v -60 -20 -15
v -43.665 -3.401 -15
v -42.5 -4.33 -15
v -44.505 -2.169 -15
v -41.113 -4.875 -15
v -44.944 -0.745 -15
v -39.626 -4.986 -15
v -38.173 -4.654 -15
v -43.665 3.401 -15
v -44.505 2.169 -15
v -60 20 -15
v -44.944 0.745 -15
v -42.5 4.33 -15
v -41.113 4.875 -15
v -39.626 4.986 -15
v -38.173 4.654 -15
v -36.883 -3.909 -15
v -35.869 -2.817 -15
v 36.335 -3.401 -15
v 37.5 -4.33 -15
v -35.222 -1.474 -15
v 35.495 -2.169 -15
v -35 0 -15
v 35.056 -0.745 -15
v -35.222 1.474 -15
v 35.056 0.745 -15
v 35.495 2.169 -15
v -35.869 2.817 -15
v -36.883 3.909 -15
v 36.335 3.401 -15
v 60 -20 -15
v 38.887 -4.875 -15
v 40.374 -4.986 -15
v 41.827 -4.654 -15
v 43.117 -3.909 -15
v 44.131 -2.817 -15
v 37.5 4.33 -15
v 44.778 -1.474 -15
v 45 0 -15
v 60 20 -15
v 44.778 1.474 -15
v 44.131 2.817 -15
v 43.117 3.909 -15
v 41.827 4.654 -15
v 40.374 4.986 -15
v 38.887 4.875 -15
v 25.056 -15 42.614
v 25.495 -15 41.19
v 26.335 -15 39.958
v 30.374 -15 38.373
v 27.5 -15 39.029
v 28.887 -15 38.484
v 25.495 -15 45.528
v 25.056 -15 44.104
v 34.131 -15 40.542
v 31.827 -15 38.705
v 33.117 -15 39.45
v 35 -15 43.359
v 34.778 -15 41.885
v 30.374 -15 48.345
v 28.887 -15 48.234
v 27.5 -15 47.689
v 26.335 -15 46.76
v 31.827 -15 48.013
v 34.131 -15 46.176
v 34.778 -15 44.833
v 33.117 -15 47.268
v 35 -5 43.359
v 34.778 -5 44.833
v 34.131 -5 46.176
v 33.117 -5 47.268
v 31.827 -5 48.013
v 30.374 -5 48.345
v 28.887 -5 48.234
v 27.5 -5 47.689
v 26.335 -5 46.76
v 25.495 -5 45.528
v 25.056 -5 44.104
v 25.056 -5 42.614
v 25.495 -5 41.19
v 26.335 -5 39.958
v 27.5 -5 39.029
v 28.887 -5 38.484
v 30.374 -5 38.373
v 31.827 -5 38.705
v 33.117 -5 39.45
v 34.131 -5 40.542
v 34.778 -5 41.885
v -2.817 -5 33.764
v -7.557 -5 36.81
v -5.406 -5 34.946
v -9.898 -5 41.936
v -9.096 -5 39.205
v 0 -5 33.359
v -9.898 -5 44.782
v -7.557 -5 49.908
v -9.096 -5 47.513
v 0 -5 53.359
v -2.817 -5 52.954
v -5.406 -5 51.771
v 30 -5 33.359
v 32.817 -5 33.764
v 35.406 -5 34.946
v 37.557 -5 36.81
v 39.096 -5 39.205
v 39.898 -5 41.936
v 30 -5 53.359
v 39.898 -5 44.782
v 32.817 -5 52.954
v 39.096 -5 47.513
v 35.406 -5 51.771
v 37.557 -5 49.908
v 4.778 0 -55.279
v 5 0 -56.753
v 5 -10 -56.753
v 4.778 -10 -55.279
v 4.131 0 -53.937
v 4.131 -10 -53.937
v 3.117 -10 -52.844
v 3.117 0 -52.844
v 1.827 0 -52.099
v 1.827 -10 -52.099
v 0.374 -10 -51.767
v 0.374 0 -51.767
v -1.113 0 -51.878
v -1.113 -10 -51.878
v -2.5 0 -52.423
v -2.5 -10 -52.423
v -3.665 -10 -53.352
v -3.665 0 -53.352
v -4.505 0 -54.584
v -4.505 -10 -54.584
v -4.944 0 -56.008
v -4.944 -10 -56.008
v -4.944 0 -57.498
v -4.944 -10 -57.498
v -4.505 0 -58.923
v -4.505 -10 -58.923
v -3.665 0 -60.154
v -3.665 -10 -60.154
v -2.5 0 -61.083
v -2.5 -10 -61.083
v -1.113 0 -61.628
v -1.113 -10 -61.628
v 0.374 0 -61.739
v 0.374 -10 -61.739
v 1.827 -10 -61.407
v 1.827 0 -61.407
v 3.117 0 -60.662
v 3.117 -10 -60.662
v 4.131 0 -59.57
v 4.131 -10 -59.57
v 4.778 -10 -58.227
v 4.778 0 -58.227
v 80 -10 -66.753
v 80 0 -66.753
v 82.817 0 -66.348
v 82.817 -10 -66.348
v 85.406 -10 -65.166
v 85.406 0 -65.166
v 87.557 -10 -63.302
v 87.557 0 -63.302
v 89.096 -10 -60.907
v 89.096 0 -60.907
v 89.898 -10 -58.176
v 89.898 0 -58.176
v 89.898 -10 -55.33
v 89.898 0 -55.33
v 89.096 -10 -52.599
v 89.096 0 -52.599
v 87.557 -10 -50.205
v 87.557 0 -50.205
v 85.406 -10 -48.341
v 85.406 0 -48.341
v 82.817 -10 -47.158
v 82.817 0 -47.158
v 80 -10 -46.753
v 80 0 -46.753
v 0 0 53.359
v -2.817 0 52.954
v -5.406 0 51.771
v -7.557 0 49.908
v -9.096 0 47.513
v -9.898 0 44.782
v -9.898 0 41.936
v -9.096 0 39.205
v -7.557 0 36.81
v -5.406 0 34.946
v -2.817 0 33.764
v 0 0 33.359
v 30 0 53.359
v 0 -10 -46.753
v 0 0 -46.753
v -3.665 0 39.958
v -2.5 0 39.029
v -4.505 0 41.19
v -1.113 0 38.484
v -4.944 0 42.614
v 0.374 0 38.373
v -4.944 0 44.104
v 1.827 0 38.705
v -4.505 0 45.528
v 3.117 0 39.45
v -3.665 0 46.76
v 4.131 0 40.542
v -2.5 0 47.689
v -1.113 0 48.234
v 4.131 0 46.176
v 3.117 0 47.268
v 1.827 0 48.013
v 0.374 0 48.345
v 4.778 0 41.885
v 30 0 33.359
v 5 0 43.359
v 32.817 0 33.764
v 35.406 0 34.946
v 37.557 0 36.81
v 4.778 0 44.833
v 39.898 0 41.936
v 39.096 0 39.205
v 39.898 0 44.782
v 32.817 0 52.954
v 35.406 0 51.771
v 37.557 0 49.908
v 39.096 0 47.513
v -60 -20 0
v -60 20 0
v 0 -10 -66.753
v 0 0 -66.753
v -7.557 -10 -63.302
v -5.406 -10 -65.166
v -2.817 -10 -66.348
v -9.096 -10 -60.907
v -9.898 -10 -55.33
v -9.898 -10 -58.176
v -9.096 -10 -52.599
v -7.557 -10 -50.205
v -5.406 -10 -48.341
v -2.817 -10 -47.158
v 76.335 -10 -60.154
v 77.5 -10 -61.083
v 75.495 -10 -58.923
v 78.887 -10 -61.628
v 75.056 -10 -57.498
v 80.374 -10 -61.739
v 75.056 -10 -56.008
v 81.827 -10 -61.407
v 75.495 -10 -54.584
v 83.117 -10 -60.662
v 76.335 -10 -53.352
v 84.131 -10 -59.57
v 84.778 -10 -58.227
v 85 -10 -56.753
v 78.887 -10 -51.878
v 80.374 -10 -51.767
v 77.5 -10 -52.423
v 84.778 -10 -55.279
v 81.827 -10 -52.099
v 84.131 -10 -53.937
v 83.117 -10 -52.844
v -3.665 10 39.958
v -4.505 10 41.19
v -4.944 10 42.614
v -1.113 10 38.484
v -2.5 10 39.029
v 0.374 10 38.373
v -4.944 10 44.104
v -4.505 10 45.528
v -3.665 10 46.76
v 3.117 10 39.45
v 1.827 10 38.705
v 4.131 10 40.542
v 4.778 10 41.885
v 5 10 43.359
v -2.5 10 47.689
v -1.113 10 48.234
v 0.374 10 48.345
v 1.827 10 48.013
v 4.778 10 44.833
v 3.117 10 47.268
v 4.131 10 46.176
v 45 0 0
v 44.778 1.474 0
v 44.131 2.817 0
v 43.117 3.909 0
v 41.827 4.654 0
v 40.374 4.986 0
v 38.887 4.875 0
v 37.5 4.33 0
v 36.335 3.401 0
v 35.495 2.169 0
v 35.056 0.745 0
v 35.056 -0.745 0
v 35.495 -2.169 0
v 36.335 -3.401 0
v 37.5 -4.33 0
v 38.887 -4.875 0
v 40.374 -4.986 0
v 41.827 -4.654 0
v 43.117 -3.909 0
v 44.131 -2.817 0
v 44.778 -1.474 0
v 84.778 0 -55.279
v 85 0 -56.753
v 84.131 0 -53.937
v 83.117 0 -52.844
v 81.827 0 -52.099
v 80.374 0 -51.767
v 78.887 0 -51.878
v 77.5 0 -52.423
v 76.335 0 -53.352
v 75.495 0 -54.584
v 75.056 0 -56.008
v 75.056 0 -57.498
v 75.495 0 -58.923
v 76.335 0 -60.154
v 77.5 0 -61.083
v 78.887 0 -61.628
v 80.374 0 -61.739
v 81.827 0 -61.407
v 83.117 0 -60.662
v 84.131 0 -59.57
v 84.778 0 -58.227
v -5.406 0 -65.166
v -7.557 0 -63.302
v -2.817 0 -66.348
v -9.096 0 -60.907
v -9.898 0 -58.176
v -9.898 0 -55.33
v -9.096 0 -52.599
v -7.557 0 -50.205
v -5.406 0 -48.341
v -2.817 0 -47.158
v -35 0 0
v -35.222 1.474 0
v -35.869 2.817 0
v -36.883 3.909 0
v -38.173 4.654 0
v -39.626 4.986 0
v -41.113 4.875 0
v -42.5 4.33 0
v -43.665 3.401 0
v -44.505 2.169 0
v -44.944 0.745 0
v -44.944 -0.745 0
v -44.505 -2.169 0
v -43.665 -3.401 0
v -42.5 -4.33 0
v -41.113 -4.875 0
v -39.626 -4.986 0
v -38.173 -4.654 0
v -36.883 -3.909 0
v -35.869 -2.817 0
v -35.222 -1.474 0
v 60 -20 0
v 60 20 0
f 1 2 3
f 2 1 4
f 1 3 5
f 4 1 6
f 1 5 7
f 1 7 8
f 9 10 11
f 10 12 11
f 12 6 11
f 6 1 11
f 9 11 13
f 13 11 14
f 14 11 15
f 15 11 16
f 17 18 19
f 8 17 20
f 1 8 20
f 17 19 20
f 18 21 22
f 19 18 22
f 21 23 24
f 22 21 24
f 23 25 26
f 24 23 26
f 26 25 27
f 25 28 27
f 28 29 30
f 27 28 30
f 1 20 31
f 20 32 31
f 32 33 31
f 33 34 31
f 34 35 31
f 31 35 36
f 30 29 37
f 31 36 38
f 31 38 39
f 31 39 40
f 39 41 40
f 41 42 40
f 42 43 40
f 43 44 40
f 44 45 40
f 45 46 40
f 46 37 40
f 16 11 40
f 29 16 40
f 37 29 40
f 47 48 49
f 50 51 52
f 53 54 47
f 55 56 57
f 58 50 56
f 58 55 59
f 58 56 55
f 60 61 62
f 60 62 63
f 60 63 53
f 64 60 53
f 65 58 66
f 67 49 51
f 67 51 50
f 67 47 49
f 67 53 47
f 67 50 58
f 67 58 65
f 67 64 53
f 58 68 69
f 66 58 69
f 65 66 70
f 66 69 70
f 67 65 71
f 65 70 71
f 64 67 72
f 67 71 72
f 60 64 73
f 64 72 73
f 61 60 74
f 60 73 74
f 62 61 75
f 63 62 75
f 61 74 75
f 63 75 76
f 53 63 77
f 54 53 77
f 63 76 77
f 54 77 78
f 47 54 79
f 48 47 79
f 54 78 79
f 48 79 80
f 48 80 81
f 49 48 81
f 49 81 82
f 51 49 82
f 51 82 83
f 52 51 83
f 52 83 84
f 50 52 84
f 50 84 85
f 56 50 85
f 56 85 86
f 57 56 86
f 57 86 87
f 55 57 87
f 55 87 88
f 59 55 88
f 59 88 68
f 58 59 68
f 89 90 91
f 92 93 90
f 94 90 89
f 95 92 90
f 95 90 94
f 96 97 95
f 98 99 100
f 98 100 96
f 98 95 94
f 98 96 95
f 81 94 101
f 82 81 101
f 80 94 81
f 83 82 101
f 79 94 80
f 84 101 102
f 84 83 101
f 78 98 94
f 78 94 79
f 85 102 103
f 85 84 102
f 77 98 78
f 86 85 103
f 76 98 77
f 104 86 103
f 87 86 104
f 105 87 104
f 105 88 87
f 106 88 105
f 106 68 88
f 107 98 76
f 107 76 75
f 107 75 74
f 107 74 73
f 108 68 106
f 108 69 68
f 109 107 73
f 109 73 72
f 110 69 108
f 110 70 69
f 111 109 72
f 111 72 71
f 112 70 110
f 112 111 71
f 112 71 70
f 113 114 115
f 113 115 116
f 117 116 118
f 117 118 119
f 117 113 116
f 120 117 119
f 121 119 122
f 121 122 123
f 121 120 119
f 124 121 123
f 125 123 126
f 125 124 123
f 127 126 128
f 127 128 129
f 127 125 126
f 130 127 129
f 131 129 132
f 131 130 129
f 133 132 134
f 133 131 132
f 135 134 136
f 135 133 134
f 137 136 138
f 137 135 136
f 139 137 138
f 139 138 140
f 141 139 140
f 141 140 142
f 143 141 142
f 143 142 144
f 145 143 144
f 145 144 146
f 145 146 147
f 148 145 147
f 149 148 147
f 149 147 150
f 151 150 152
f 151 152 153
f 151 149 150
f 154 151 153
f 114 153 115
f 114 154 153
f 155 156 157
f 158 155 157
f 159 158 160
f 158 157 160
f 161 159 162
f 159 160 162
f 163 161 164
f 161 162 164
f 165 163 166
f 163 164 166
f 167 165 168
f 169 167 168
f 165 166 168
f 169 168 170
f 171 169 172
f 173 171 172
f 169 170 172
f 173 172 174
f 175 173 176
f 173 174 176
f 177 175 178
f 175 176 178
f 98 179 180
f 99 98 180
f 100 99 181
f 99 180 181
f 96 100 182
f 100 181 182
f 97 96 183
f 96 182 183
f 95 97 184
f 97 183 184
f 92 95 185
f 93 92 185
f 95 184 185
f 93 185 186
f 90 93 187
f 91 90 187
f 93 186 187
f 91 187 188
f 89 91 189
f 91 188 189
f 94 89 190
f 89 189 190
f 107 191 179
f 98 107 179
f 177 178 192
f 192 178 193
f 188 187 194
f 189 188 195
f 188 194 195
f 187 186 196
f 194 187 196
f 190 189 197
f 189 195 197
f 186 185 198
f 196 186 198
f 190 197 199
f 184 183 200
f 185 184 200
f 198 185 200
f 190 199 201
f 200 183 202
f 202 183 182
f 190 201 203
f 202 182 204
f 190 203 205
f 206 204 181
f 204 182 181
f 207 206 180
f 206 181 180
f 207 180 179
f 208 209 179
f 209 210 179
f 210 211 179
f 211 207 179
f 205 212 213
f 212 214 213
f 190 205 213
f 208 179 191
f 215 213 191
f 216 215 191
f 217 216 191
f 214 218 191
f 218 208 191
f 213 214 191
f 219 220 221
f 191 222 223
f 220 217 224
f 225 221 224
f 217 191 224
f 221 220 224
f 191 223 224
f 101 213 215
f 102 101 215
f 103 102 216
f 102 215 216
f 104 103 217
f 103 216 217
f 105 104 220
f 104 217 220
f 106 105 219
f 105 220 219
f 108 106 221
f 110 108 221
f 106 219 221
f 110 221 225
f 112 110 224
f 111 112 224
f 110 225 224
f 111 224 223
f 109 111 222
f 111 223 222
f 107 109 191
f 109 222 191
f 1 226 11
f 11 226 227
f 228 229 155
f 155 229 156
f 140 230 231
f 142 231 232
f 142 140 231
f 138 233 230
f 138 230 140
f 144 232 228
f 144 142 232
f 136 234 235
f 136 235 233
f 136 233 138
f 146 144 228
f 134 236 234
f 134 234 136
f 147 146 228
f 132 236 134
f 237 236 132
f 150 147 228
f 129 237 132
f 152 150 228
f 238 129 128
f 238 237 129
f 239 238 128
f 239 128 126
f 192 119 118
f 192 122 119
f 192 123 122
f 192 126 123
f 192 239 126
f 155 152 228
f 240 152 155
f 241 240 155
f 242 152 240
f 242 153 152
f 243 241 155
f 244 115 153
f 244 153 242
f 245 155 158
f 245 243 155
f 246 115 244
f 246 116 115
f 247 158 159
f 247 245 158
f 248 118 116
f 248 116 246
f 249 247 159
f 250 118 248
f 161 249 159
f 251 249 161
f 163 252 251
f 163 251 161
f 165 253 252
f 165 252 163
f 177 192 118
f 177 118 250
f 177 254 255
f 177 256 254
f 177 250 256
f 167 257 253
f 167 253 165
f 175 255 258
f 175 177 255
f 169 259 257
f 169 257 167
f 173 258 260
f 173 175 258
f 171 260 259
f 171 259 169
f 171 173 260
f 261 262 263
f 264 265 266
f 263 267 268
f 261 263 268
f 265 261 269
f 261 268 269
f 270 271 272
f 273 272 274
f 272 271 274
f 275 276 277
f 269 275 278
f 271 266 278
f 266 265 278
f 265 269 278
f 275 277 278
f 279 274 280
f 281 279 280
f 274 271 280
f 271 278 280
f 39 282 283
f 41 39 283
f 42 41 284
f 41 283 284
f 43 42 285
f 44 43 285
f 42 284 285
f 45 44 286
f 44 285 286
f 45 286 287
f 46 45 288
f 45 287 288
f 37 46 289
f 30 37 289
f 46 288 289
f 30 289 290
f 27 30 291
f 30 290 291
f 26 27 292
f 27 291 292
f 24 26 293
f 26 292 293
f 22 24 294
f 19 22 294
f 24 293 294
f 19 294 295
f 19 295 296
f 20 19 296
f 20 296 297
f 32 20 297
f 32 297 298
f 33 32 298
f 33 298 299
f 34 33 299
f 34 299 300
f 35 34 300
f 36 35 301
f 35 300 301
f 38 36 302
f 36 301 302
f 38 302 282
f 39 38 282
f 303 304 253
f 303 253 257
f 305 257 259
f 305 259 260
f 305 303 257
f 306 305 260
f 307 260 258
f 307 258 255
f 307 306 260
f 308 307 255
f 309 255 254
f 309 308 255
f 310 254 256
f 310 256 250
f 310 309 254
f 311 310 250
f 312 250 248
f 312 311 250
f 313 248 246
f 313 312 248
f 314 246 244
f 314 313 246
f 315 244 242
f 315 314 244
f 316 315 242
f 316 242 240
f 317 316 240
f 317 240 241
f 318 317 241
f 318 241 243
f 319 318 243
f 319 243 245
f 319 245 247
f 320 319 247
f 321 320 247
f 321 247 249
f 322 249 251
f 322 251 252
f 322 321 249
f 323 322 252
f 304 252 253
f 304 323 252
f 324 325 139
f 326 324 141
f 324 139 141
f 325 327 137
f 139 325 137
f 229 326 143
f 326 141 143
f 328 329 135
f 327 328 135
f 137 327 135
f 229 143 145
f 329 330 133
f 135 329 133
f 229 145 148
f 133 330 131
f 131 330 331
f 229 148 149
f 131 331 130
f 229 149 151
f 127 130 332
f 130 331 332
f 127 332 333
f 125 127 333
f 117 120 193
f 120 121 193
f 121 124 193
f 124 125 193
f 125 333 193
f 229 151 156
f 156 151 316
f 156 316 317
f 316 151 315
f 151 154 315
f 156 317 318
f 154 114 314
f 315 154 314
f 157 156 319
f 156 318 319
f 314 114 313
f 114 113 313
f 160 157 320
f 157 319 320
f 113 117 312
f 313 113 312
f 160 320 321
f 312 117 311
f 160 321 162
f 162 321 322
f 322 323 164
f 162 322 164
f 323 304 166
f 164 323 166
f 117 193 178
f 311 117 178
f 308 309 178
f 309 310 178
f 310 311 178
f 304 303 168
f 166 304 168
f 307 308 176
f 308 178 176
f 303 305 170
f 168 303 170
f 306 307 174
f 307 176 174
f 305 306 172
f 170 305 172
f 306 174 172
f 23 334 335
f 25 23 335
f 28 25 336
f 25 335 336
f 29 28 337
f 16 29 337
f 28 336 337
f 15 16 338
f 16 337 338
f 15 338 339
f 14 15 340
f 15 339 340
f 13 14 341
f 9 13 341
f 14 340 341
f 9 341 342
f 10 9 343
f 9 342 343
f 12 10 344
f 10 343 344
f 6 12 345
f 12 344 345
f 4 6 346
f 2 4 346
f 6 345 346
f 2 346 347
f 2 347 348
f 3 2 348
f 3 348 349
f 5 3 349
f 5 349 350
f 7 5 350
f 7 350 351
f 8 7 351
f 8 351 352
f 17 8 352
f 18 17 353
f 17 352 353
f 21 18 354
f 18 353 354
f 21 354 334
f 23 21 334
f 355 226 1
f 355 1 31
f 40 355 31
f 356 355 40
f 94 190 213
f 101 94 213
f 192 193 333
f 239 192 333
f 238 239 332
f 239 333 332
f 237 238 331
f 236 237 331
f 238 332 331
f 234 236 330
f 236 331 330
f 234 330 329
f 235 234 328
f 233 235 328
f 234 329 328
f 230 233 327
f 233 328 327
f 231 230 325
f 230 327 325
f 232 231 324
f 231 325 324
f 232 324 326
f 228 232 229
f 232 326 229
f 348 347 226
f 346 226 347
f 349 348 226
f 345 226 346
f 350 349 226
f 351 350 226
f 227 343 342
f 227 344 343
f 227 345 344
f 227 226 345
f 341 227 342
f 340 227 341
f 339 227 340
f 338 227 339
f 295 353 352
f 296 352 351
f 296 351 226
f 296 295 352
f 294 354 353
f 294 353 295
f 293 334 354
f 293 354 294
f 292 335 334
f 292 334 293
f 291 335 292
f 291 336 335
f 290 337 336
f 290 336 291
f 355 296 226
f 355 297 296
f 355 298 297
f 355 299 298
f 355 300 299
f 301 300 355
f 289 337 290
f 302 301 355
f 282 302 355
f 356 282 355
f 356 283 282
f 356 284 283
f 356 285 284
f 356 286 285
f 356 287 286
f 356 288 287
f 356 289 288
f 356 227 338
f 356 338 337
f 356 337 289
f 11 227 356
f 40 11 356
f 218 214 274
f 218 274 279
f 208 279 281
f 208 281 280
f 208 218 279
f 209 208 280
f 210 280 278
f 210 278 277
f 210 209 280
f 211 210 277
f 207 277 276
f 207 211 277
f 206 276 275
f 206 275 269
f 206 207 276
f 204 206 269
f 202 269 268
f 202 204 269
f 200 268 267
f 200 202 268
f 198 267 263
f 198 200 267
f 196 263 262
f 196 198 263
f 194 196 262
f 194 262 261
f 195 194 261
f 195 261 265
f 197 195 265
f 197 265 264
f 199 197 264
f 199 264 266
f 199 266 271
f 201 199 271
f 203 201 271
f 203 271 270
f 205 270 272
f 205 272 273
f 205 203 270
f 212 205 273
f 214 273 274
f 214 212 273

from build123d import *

# Parameters (mm, degrees)
F0_W     = 120
F0_H     = 40
F0_R     = 5
F1_DEPTH = 15
F2_R     = 5
F3_DEPTH = 5
F4_DEPTH = 15
F5_DEPTH = 10
F6_R     = 5
F7_DEPTH = 10


with BuildPart() as f1:
    # F0 (on Top) → F1 (new body)
    with BuildSketch(Plane.XY):
        Rectangle(F0_W, F0_H)
        with Locations((-40, 0)):
            Circle(F0_R, mode=Mode.SUBTRACT)
        with Locations((40, 0)):
            Circle(F0_R, mode=Mode.SUBTRACT)
    extrude(amount=-F1_DEPTH)


with BuildPart() as f3:
    # F2 (on Front) → F3 (new body)
    with BuildSketch(Plane.XZ):
        with BuildLine():
            Line((30, 53.35892), (0, 53.35892))
            ThreePointArc((0, 53.35892), (-10, 43.35892), (0, 33.35892))
            Line((0, 33.35892), (30, 33.35892))
            ThreePointArc((30, 33.35892), (40, 43.35892), (30, 53.35892))
        make_face()
        with Locations((0, 43.35892)):
            Circle(F2_R, mode=Mode.SUBTRACT)
        with Locations((30, 43.35892)):
            Circle(F2_R, mode=Mode.SUBTRACT)
        with Locations((30, 43.35892)):
            Circle(F2_R)
        with Locations((0, 43.35892)):
            Circle(F2_R)
    extrude(amount=F3_DEPTH)

    # F2 (on Front) → F4 (join)
    with BuildSketch(Plane.XZ):
        with Locations((30, 43.35892)):
            Circle(F2_R)
    extrude(amount=F4_DEPTH)

    # F2 (on Front) → F5 (join)
    with BuildSketch(Plane.XZ):
        with Locations((0, 43.35892)):
            Circle(F2_R)
    extrude(amount=-F5_DEPTH)


with BuildPart() as f7:
    # F6 (on Front) → F7 (new body)
    with BuildSketch(Plane.XZ):
        with BuildLine():
            Line((80, -46.753127), (0, -46.753127))
            ThreePointArc((0, -46.753127), (-10, -56.753127), (0, -66.753127))
            Line((0, -66.753127), (80, -66.753127))
            ThreePointArc((80, -66.753127), (90, -56.753127), (80, -46.753127))
        make_face()
        with Locations((0, -56.753127)):
            Circle(F6_R, mode=Mode.SUBTRACT)
        with Locations((80, -56.753127)):
            Circle(F6_R, mode=Mode.SUBTRACT)
    extrude(amount=F7_DEPTH)


solid = Compound([f1.part, f3.part, f7.part])
